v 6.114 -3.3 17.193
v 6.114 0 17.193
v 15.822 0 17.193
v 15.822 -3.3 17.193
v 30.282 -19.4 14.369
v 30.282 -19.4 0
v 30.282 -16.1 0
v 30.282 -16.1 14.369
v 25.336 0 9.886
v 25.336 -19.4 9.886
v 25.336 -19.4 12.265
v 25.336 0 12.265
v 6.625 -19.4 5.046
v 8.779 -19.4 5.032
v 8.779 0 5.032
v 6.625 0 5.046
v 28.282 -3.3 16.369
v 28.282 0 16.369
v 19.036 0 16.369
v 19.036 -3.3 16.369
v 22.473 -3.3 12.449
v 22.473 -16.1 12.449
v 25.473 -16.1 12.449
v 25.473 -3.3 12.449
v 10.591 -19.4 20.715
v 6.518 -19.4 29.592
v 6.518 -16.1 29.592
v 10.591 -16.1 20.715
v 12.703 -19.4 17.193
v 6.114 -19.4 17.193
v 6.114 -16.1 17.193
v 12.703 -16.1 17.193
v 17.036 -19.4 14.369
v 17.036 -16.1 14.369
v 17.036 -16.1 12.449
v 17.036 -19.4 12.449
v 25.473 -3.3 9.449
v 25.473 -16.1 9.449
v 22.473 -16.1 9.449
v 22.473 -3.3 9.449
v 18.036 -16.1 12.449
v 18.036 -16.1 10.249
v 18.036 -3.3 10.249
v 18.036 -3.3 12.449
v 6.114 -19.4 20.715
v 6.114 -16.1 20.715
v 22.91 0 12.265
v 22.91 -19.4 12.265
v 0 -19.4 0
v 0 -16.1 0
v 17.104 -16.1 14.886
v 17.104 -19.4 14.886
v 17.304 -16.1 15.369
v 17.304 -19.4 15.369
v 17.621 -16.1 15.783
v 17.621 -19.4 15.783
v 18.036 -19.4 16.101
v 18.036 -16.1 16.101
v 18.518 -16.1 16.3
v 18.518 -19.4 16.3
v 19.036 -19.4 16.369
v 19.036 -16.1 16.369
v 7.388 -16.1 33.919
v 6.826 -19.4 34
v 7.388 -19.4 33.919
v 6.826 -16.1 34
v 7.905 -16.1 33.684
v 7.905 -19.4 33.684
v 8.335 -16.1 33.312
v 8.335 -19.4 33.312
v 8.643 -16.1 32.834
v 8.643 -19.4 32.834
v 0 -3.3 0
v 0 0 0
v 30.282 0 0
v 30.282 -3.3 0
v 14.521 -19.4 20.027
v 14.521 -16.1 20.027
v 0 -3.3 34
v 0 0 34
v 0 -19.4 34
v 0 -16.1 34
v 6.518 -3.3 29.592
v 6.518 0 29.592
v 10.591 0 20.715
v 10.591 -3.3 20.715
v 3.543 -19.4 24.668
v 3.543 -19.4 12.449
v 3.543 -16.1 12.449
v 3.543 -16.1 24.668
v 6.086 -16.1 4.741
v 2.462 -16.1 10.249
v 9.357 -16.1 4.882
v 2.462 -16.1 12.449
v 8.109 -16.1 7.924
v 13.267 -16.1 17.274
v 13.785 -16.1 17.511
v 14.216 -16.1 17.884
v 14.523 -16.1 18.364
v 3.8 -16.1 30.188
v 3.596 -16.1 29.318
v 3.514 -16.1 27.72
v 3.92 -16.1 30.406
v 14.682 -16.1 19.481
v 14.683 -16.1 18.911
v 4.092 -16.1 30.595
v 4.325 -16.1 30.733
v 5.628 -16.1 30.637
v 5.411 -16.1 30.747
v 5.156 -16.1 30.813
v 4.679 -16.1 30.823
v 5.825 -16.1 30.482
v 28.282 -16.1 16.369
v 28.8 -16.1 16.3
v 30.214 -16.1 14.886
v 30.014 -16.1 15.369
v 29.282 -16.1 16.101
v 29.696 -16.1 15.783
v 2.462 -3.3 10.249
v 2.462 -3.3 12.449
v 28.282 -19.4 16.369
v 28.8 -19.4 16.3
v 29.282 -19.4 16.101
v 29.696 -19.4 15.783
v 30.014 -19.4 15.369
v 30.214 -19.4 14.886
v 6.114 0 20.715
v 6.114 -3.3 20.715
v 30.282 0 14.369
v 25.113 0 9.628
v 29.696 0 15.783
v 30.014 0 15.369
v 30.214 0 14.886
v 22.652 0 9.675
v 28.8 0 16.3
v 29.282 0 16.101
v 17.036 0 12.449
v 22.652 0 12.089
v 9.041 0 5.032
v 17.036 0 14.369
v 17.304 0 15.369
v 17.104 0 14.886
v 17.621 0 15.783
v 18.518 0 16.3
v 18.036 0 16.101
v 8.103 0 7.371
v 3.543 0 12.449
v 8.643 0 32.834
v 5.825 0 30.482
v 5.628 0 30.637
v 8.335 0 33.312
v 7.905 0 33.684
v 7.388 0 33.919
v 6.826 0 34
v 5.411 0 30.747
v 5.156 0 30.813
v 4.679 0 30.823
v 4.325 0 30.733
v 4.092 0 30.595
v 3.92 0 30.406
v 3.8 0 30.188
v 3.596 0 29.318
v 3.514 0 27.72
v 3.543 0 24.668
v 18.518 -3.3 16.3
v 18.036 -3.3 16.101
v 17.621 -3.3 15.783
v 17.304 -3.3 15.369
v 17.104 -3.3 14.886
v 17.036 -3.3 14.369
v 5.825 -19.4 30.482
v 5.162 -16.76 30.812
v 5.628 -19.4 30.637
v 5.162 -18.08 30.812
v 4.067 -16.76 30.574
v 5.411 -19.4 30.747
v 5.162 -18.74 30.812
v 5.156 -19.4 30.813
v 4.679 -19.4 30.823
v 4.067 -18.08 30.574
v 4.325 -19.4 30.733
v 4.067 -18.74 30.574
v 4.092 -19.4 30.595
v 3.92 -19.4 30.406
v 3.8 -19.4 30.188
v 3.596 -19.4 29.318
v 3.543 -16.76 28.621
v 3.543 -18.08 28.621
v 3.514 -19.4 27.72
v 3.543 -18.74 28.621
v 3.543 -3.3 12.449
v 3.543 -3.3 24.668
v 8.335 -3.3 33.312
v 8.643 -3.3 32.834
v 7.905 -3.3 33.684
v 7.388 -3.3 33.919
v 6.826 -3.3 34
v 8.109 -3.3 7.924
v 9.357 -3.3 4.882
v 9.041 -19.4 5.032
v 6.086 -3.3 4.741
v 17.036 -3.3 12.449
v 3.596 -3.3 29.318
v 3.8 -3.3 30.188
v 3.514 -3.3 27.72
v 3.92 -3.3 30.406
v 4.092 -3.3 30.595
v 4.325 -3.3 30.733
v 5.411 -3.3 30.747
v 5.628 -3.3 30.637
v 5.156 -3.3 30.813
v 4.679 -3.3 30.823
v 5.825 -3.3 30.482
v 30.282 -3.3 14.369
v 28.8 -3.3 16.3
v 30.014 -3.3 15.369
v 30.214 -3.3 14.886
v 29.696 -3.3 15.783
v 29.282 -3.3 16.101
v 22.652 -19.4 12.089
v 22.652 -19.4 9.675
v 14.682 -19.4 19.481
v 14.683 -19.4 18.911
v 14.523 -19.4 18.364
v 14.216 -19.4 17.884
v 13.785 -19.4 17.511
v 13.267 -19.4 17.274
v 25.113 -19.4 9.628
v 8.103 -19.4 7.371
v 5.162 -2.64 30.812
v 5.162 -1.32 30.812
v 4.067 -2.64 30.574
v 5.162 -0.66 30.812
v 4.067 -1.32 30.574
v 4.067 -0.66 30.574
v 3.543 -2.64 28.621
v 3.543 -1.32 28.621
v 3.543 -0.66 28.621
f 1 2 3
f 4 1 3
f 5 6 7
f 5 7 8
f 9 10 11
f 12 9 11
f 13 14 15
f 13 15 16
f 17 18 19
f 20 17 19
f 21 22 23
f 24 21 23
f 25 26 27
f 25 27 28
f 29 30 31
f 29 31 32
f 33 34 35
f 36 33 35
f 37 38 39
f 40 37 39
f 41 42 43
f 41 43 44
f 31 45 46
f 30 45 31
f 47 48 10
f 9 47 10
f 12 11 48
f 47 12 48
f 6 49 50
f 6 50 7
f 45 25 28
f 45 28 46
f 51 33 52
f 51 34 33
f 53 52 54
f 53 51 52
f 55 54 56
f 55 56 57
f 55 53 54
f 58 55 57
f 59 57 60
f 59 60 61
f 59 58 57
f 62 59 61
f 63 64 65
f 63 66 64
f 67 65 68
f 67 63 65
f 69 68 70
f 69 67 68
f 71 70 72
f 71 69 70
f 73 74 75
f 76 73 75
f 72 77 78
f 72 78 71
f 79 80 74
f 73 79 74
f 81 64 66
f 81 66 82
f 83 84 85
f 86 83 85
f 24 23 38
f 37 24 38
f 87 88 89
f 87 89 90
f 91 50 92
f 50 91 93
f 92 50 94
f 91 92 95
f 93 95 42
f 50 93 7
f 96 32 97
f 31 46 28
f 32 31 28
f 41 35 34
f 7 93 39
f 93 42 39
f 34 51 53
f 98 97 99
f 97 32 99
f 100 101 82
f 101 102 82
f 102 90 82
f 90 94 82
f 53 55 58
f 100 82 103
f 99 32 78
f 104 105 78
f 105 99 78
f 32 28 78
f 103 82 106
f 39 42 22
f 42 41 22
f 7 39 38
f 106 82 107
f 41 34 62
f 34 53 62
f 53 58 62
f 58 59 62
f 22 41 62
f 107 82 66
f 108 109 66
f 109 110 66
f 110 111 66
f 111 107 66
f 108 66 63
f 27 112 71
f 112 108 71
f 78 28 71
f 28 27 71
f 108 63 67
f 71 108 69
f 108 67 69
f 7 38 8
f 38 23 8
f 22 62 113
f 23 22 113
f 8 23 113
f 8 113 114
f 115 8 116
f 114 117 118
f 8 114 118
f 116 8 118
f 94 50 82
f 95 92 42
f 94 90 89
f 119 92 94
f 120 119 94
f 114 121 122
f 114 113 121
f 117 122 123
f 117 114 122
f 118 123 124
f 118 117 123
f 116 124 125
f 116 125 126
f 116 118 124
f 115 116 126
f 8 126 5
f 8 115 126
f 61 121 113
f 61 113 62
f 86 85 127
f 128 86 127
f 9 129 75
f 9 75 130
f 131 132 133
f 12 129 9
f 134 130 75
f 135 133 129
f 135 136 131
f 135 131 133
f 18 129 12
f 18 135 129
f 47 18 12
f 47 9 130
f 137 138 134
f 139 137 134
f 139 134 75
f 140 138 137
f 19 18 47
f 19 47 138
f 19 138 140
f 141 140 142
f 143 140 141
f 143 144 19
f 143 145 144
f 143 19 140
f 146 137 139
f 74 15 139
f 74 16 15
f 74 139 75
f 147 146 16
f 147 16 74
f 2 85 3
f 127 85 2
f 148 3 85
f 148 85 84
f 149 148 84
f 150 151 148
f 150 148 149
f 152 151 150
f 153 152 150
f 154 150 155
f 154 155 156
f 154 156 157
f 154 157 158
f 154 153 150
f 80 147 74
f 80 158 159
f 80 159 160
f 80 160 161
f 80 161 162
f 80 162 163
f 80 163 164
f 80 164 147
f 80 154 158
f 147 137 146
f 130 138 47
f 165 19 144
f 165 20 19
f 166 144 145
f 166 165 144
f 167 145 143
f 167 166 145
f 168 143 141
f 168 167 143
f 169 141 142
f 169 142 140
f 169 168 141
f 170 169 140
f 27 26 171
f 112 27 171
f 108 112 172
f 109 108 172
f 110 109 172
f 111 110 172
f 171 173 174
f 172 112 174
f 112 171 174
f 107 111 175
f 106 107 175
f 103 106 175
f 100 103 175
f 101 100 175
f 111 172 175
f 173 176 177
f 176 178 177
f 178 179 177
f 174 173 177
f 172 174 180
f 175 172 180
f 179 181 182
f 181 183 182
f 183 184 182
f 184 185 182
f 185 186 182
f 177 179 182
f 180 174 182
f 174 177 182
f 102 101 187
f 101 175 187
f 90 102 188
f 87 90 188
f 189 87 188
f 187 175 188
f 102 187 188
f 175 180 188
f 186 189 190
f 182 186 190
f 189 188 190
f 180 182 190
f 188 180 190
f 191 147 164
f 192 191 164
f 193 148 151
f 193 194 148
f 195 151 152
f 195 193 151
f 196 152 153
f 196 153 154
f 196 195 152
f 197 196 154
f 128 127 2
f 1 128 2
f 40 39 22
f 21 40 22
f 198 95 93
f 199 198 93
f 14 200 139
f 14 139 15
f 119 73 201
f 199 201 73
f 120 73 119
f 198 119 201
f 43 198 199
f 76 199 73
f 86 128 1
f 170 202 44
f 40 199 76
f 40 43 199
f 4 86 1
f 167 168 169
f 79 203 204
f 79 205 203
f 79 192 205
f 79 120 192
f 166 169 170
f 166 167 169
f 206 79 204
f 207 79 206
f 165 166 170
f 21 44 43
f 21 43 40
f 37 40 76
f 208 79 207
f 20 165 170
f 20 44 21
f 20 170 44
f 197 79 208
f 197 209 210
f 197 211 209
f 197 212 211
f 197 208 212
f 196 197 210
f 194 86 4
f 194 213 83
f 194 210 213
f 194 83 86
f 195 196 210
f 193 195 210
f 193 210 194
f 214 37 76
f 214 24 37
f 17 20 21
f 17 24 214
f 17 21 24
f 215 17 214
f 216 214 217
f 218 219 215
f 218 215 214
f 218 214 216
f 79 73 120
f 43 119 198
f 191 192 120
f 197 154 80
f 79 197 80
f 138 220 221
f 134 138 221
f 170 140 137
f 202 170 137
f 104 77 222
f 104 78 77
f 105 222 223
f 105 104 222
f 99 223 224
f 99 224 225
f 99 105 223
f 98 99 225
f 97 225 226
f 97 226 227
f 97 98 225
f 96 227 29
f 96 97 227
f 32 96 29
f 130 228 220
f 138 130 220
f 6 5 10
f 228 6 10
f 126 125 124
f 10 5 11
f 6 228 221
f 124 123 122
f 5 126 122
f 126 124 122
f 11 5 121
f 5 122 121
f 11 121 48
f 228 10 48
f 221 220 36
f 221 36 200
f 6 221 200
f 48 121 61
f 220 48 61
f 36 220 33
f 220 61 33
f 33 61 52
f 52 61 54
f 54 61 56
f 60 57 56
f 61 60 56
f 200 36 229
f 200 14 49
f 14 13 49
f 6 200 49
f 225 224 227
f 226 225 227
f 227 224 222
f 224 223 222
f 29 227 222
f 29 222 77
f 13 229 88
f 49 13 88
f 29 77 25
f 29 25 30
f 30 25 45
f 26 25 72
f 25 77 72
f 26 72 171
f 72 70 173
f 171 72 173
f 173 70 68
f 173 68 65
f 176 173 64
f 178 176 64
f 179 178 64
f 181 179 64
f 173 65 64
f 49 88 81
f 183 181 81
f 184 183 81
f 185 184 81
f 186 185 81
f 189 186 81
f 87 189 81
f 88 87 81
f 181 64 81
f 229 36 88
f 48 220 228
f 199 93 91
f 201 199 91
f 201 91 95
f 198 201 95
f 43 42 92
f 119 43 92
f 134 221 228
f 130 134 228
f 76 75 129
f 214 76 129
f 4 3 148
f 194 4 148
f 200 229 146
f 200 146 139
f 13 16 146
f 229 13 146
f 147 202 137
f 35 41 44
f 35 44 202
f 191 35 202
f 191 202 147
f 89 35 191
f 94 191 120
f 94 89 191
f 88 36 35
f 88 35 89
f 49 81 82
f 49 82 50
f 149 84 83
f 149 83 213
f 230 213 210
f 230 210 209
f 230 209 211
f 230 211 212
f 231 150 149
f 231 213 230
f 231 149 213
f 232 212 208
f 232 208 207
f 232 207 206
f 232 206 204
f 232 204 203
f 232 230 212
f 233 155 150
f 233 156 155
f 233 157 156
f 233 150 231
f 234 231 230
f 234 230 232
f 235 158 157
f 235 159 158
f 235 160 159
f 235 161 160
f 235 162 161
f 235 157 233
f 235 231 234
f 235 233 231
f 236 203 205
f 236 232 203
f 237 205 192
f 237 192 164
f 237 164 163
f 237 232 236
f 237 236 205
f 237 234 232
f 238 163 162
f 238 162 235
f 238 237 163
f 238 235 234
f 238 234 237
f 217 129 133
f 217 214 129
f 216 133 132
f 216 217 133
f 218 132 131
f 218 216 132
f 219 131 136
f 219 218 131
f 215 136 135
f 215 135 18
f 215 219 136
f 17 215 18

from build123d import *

# Parameters (mm, degrees)
F0_W     = 3
F0_H     = 3
F1_DEPTH = 3.3
F3_DEPTH = 9.7
F4_DEPTH = 25
F5_W     = 15.5733765569
F5_H     = 2.1997606382
F6_DEPTH = 9.7
F8_R     = 2


with BuildPart() as f1:
    # F0 (on Front) → F1 (new body)
    with BuildSketch(Plane.XZ):
        with BuildLine():
            Line((0, 34), (0, 0))
            Line((0, 0), (30.2820131183, 0))
            Line((30.2820131183, 0), (30.2820131183, 16.368644312))
            Line((30.2820131183, 16.368644312), (17.0356687158, 16.368644312))
            Line((17.0356687158, 16.368644312), (17.0356687158, 12.4485930428))
            Line((17.0356687158, 12.4485930428), (18.0357955396, 12.4485930428))
            Line((18.0357955396, 12.4485930428), (18.0357955396, 10.2488324046))
            Line((18.0357955396, 10.2488324046), (2.4624189828, 10.2488324046))
            Line((2.4624189828, 10.2488324046), (2.4624189828, 12.4485930428))
            Line((2.4624189828, 12.4485930428), (3.5426469985, 12.4485930428))
            Line((3.5426469985, 12.4485930428), (3.5426469985, 24.6681645513))
            add(Edge.make_bspline(
                [(6.5175484558, 29.5915287649), (6.2907197581, 29.9241725963), (5.8790854313, 30.5278335133), (5.1978575268, 30.8967943754), (3.7389888493, 30.7860278706), (3.4619052088, 28.4189645391), (3.5129095402, 26.0495961355), (3.5426469985, 24.6681645513)],
                knots=[0, 0, 0, 0, 0.1657910439, 0.3008670659, 0.4665066802, 0.6889531738, 1, 1, 1, 1], degree=3))
            Line((6.5175484558, 29.5915287649), (10.5911474675, 20.7152888179))
            Line((10.5911474675, 20.7152888179), (6.1143967323, 20.7152888179))
            Line((6.1143967323, 20.7152888179), (6.1143967323, 17.1928294003))
            Line((6.1143967323, 17.1928294003), (15.821730718, 17.1928294003))
            Line((15.821730718, 17.1928294003), (8.1083662808, 34))
            Line((8.1083662808, 34), (0, 34))
        make_face()
        with Locations((23.9732756615, 10.9485930428)):
            Rectangle(F0_W, F0_H, mode=Mode.SUBTRACT)
    extrude(amount=F1_DEPTH)

    # F2 (on face) → F3 (join)
    with BuildSketch(Plane(origin=(0, 0, 0), x_dir=(-1, 0, 0), z_dir=(0, 1, 0))):
        Polygon((-8.1085339189, 7.924452424), (-9.3574654311, 4.8816055059), (-6.0858423822, 4.7413739376), align=None)
        Polygon((-6.6248354992, 5.045762931), (-8.7793627754, 5.0320993178), (-9.0411501005, 5.0320993178), (-8.1026144326, 7.3713208549), align=None, mode=Mode.SUBTRACT)
        Polygon((-25.4732756615, 12.4485930428), (-25.4732756615, 9.4485930428), (-22.4732756615, 12.4485930428), align=None)
        Polygon((-22.9099839926, 12.2652184218), (-25.3357663751, 9.8863113672), (-25.3357663751, 12.2652184218), align=None, mode=Mode.SUBTRACT)
        Polygon((-22.4732756615, 12.4485930428), (-25.4732756615, 9.4485930428), (-22.4732756615, 9.4485930428), align=None)
        Polygon((-22.6521715522, 9.6753742546), (-25.1131094992, 9.6284989268), (-22.6521715522, 12.0894368738), align=None, mode=Mode.SUBTRACT)
    extrude(amount=-F3_DEPTH)

    # F2 (on face) → F4 (cut)
    with BuildSketch(Plane(origin=(0, 0, 0), x_dir=(-1, 0, 0), z_dir=(0, 1, 0))):
        Polygon((-9.0411501005, 5.0320993178), (-8.7793627754, 5.0320993178), (-6.6248354992, 5.045762931), (-8.1026144326, 7.3713208549), align=None)
    extrude(amount=-F4_DEPTH, mode=Mode.SUBTRACT)

    # F5 (on face) → F6 (join)
    with BuildSketch(Plane(origin=(0, 0, 0), x_dir=(-1, 0, 0), z_dir=(0, 1, 0))):
        with Locations((-10.2491072612, 11.3487127237)):
            Rectangle(F5_W, F5_H)
    extrude(amount=-F6_DEPTH)

    # F7: F1 across face


with BuildPart() as f1_1:
    add(f1.part)
    add(f1.part.mirror(Plane(origin=(10.2491072612, -9.7, 11.3487127237), x_dir=(-1, 0, 0), z_dir=(0, -1, 0))))

    # F8
    f8_edges = [f1_1.edges().sort_by_distance(p)[0] for p in [
        (30.282013, -17.75, 16.368644),
        (30.282013, -1.65, 16.368644),
        (8.108366, -17.75, 34),
        (8.108366, -1.65, 34),
        (15.821731, -17.75, 17.192829),
        (17.035669, -17.75, 16.368644),
        (17.035669, -1.65, 16.368644),
    ]]
    fillet(f8_edges, radius=F8_R)


solid = f1_1.part
